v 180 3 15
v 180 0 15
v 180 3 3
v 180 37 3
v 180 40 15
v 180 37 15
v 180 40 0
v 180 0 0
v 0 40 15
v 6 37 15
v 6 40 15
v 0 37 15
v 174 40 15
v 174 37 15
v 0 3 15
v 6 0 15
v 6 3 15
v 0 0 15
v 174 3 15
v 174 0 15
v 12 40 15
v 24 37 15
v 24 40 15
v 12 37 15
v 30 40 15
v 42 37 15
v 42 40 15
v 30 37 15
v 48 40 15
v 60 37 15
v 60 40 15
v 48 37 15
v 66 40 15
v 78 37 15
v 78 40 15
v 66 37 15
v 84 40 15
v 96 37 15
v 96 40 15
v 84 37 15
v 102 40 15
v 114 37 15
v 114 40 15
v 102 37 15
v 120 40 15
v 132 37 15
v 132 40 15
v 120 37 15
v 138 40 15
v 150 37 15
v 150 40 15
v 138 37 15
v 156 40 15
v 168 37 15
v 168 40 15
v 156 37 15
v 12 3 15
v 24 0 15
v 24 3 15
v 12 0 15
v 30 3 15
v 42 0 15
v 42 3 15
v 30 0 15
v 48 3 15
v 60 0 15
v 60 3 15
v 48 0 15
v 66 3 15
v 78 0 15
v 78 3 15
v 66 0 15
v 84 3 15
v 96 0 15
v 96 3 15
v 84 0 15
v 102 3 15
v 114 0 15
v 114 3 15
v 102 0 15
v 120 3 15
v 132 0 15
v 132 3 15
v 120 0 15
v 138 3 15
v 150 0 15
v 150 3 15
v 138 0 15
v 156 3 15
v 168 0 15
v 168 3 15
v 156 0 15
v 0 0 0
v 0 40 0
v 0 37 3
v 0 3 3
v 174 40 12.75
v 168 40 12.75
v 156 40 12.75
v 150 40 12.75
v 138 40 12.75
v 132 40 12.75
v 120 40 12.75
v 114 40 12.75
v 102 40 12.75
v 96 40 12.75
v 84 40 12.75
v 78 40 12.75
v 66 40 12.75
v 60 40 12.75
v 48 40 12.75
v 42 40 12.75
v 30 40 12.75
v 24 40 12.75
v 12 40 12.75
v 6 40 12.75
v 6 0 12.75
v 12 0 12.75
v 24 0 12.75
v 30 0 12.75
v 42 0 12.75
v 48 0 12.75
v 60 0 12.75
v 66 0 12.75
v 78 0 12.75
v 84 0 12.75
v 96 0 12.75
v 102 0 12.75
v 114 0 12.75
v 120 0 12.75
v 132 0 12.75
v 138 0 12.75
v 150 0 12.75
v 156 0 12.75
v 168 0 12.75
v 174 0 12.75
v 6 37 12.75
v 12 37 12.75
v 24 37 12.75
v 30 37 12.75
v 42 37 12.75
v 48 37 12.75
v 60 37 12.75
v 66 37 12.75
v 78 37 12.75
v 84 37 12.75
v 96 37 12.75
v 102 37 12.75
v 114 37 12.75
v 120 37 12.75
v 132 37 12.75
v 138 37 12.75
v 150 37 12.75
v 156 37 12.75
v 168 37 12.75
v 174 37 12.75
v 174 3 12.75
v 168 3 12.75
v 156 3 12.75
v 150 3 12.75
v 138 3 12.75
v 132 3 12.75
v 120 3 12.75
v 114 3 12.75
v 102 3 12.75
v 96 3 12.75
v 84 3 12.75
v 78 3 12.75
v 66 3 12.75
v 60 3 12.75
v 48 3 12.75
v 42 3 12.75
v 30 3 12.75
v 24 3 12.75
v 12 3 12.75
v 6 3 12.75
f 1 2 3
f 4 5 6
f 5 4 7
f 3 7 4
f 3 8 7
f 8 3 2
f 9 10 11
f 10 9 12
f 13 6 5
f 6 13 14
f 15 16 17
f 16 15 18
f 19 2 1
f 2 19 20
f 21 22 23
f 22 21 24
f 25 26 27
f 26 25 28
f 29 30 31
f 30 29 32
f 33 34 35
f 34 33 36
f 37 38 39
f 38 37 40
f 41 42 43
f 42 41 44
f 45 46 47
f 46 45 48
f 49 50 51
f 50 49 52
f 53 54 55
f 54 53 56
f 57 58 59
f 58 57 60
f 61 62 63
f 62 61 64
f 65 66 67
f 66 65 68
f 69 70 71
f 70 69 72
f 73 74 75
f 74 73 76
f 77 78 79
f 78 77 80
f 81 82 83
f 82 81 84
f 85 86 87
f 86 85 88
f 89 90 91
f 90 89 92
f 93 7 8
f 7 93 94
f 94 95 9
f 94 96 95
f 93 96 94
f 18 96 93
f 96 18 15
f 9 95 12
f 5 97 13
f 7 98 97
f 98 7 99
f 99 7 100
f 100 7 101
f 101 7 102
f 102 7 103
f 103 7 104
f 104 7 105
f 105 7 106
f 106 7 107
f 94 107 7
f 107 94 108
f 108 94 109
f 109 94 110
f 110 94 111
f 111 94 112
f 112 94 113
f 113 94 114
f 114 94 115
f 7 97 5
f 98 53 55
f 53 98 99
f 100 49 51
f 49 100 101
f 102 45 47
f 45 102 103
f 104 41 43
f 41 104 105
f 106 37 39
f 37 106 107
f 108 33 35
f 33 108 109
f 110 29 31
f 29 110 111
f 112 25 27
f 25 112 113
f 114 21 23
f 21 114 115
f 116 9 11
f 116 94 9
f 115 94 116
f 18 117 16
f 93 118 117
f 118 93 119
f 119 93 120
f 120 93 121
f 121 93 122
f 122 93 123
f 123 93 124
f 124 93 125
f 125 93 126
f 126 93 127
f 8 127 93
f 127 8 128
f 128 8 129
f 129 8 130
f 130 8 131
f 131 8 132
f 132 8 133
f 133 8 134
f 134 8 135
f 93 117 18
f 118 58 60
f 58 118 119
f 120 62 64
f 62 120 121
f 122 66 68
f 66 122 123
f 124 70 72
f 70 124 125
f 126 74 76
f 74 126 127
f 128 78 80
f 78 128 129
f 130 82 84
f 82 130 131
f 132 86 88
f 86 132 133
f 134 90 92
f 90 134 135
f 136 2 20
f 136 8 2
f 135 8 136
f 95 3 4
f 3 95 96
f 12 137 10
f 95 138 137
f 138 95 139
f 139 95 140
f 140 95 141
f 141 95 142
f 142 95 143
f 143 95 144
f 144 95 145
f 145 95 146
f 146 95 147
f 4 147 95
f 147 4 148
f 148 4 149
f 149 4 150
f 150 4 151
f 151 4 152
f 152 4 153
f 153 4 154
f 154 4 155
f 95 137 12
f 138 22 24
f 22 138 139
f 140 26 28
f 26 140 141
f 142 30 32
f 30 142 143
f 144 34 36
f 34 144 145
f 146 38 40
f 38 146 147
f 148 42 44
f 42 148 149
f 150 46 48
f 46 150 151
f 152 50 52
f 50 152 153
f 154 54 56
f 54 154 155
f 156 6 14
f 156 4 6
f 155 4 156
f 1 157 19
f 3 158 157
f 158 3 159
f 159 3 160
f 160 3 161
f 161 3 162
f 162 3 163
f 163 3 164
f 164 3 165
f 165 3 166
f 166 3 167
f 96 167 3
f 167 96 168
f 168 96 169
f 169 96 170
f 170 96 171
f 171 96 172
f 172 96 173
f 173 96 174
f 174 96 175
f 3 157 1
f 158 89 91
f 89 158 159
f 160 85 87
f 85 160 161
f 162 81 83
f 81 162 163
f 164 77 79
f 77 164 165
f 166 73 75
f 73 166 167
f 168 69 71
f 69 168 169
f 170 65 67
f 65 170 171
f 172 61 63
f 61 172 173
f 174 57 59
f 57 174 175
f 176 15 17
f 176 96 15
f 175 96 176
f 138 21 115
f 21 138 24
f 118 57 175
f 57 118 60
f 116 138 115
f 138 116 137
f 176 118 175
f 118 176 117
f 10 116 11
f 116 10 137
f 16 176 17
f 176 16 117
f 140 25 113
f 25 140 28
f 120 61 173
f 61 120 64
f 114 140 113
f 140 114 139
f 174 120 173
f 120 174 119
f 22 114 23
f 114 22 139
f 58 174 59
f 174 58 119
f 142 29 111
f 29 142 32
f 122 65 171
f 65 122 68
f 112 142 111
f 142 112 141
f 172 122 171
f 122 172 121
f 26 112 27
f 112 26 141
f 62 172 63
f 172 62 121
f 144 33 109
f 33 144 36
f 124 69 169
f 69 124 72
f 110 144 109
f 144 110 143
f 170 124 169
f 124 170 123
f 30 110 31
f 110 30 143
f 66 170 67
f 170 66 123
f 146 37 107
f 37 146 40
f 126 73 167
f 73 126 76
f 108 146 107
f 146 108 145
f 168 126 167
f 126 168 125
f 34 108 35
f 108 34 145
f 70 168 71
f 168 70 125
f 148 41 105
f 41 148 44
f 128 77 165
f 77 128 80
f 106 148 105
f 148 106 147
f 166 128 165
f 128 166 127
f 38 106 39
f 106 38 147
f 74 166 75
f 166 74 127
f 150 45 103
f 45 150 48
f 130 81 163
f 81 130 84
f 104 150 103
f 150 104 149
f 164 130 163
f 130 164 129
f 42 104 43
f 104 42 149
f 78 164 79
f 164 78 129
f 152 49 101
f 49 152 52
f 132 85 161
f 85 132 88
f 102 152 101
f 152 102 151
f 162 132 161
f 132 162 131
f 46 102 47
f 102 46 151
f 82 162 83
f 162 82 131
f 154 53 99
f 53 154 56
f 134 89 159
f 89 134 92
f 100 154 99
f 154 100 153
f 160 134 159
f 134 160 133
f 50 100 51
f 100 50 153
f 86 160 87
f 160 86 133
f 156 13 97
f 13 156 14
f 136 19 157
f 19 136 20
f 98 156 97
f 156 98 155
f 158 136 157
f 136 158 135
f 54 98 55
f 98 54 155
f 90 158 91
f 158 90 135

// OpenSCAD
$fn = 32;

// ----------------------------------------------------------------------
// Cable duct: 180 x 40 x 15 mm, 10 fingers
// ----------------------------------------------------------------------

// --- parameters (mm) ---
channel_l = 180;          // duct length, X
channel_w = 40;           // duct width, Y
channel_h = 15;           // duct height, Z
channel_t = 3;            // side wall thickness
floor_t = 3;              // floor thickness
slot_w = 6;               // finger slot width
slot_h = 9.75;            // finger slot height
fingers = 10;             // number of finger slots per side
pitch = 18;               // finger pitch

module shell() {
  difference() {
    cube([channel_l, channel_w, channel_h]);
    /* open top channel */
    translate([-channel_t - 1, channel_t, floor_t])
      cube([channel_l + 2 * channel_t + 2, channel_w - 2 * channel_t, channel_h + 1]);
  }
}

difference() {
  union() {
    shell();
  }
  /* finger slots cut through both side walls */
  for (i = [0 : fingers - 1]) translate([pitch / 2 + i * pitch - slot_w / 2, -1, floor_t + slot_h]) cube([slot_w, channel_w + 2, channel_h]);
}
